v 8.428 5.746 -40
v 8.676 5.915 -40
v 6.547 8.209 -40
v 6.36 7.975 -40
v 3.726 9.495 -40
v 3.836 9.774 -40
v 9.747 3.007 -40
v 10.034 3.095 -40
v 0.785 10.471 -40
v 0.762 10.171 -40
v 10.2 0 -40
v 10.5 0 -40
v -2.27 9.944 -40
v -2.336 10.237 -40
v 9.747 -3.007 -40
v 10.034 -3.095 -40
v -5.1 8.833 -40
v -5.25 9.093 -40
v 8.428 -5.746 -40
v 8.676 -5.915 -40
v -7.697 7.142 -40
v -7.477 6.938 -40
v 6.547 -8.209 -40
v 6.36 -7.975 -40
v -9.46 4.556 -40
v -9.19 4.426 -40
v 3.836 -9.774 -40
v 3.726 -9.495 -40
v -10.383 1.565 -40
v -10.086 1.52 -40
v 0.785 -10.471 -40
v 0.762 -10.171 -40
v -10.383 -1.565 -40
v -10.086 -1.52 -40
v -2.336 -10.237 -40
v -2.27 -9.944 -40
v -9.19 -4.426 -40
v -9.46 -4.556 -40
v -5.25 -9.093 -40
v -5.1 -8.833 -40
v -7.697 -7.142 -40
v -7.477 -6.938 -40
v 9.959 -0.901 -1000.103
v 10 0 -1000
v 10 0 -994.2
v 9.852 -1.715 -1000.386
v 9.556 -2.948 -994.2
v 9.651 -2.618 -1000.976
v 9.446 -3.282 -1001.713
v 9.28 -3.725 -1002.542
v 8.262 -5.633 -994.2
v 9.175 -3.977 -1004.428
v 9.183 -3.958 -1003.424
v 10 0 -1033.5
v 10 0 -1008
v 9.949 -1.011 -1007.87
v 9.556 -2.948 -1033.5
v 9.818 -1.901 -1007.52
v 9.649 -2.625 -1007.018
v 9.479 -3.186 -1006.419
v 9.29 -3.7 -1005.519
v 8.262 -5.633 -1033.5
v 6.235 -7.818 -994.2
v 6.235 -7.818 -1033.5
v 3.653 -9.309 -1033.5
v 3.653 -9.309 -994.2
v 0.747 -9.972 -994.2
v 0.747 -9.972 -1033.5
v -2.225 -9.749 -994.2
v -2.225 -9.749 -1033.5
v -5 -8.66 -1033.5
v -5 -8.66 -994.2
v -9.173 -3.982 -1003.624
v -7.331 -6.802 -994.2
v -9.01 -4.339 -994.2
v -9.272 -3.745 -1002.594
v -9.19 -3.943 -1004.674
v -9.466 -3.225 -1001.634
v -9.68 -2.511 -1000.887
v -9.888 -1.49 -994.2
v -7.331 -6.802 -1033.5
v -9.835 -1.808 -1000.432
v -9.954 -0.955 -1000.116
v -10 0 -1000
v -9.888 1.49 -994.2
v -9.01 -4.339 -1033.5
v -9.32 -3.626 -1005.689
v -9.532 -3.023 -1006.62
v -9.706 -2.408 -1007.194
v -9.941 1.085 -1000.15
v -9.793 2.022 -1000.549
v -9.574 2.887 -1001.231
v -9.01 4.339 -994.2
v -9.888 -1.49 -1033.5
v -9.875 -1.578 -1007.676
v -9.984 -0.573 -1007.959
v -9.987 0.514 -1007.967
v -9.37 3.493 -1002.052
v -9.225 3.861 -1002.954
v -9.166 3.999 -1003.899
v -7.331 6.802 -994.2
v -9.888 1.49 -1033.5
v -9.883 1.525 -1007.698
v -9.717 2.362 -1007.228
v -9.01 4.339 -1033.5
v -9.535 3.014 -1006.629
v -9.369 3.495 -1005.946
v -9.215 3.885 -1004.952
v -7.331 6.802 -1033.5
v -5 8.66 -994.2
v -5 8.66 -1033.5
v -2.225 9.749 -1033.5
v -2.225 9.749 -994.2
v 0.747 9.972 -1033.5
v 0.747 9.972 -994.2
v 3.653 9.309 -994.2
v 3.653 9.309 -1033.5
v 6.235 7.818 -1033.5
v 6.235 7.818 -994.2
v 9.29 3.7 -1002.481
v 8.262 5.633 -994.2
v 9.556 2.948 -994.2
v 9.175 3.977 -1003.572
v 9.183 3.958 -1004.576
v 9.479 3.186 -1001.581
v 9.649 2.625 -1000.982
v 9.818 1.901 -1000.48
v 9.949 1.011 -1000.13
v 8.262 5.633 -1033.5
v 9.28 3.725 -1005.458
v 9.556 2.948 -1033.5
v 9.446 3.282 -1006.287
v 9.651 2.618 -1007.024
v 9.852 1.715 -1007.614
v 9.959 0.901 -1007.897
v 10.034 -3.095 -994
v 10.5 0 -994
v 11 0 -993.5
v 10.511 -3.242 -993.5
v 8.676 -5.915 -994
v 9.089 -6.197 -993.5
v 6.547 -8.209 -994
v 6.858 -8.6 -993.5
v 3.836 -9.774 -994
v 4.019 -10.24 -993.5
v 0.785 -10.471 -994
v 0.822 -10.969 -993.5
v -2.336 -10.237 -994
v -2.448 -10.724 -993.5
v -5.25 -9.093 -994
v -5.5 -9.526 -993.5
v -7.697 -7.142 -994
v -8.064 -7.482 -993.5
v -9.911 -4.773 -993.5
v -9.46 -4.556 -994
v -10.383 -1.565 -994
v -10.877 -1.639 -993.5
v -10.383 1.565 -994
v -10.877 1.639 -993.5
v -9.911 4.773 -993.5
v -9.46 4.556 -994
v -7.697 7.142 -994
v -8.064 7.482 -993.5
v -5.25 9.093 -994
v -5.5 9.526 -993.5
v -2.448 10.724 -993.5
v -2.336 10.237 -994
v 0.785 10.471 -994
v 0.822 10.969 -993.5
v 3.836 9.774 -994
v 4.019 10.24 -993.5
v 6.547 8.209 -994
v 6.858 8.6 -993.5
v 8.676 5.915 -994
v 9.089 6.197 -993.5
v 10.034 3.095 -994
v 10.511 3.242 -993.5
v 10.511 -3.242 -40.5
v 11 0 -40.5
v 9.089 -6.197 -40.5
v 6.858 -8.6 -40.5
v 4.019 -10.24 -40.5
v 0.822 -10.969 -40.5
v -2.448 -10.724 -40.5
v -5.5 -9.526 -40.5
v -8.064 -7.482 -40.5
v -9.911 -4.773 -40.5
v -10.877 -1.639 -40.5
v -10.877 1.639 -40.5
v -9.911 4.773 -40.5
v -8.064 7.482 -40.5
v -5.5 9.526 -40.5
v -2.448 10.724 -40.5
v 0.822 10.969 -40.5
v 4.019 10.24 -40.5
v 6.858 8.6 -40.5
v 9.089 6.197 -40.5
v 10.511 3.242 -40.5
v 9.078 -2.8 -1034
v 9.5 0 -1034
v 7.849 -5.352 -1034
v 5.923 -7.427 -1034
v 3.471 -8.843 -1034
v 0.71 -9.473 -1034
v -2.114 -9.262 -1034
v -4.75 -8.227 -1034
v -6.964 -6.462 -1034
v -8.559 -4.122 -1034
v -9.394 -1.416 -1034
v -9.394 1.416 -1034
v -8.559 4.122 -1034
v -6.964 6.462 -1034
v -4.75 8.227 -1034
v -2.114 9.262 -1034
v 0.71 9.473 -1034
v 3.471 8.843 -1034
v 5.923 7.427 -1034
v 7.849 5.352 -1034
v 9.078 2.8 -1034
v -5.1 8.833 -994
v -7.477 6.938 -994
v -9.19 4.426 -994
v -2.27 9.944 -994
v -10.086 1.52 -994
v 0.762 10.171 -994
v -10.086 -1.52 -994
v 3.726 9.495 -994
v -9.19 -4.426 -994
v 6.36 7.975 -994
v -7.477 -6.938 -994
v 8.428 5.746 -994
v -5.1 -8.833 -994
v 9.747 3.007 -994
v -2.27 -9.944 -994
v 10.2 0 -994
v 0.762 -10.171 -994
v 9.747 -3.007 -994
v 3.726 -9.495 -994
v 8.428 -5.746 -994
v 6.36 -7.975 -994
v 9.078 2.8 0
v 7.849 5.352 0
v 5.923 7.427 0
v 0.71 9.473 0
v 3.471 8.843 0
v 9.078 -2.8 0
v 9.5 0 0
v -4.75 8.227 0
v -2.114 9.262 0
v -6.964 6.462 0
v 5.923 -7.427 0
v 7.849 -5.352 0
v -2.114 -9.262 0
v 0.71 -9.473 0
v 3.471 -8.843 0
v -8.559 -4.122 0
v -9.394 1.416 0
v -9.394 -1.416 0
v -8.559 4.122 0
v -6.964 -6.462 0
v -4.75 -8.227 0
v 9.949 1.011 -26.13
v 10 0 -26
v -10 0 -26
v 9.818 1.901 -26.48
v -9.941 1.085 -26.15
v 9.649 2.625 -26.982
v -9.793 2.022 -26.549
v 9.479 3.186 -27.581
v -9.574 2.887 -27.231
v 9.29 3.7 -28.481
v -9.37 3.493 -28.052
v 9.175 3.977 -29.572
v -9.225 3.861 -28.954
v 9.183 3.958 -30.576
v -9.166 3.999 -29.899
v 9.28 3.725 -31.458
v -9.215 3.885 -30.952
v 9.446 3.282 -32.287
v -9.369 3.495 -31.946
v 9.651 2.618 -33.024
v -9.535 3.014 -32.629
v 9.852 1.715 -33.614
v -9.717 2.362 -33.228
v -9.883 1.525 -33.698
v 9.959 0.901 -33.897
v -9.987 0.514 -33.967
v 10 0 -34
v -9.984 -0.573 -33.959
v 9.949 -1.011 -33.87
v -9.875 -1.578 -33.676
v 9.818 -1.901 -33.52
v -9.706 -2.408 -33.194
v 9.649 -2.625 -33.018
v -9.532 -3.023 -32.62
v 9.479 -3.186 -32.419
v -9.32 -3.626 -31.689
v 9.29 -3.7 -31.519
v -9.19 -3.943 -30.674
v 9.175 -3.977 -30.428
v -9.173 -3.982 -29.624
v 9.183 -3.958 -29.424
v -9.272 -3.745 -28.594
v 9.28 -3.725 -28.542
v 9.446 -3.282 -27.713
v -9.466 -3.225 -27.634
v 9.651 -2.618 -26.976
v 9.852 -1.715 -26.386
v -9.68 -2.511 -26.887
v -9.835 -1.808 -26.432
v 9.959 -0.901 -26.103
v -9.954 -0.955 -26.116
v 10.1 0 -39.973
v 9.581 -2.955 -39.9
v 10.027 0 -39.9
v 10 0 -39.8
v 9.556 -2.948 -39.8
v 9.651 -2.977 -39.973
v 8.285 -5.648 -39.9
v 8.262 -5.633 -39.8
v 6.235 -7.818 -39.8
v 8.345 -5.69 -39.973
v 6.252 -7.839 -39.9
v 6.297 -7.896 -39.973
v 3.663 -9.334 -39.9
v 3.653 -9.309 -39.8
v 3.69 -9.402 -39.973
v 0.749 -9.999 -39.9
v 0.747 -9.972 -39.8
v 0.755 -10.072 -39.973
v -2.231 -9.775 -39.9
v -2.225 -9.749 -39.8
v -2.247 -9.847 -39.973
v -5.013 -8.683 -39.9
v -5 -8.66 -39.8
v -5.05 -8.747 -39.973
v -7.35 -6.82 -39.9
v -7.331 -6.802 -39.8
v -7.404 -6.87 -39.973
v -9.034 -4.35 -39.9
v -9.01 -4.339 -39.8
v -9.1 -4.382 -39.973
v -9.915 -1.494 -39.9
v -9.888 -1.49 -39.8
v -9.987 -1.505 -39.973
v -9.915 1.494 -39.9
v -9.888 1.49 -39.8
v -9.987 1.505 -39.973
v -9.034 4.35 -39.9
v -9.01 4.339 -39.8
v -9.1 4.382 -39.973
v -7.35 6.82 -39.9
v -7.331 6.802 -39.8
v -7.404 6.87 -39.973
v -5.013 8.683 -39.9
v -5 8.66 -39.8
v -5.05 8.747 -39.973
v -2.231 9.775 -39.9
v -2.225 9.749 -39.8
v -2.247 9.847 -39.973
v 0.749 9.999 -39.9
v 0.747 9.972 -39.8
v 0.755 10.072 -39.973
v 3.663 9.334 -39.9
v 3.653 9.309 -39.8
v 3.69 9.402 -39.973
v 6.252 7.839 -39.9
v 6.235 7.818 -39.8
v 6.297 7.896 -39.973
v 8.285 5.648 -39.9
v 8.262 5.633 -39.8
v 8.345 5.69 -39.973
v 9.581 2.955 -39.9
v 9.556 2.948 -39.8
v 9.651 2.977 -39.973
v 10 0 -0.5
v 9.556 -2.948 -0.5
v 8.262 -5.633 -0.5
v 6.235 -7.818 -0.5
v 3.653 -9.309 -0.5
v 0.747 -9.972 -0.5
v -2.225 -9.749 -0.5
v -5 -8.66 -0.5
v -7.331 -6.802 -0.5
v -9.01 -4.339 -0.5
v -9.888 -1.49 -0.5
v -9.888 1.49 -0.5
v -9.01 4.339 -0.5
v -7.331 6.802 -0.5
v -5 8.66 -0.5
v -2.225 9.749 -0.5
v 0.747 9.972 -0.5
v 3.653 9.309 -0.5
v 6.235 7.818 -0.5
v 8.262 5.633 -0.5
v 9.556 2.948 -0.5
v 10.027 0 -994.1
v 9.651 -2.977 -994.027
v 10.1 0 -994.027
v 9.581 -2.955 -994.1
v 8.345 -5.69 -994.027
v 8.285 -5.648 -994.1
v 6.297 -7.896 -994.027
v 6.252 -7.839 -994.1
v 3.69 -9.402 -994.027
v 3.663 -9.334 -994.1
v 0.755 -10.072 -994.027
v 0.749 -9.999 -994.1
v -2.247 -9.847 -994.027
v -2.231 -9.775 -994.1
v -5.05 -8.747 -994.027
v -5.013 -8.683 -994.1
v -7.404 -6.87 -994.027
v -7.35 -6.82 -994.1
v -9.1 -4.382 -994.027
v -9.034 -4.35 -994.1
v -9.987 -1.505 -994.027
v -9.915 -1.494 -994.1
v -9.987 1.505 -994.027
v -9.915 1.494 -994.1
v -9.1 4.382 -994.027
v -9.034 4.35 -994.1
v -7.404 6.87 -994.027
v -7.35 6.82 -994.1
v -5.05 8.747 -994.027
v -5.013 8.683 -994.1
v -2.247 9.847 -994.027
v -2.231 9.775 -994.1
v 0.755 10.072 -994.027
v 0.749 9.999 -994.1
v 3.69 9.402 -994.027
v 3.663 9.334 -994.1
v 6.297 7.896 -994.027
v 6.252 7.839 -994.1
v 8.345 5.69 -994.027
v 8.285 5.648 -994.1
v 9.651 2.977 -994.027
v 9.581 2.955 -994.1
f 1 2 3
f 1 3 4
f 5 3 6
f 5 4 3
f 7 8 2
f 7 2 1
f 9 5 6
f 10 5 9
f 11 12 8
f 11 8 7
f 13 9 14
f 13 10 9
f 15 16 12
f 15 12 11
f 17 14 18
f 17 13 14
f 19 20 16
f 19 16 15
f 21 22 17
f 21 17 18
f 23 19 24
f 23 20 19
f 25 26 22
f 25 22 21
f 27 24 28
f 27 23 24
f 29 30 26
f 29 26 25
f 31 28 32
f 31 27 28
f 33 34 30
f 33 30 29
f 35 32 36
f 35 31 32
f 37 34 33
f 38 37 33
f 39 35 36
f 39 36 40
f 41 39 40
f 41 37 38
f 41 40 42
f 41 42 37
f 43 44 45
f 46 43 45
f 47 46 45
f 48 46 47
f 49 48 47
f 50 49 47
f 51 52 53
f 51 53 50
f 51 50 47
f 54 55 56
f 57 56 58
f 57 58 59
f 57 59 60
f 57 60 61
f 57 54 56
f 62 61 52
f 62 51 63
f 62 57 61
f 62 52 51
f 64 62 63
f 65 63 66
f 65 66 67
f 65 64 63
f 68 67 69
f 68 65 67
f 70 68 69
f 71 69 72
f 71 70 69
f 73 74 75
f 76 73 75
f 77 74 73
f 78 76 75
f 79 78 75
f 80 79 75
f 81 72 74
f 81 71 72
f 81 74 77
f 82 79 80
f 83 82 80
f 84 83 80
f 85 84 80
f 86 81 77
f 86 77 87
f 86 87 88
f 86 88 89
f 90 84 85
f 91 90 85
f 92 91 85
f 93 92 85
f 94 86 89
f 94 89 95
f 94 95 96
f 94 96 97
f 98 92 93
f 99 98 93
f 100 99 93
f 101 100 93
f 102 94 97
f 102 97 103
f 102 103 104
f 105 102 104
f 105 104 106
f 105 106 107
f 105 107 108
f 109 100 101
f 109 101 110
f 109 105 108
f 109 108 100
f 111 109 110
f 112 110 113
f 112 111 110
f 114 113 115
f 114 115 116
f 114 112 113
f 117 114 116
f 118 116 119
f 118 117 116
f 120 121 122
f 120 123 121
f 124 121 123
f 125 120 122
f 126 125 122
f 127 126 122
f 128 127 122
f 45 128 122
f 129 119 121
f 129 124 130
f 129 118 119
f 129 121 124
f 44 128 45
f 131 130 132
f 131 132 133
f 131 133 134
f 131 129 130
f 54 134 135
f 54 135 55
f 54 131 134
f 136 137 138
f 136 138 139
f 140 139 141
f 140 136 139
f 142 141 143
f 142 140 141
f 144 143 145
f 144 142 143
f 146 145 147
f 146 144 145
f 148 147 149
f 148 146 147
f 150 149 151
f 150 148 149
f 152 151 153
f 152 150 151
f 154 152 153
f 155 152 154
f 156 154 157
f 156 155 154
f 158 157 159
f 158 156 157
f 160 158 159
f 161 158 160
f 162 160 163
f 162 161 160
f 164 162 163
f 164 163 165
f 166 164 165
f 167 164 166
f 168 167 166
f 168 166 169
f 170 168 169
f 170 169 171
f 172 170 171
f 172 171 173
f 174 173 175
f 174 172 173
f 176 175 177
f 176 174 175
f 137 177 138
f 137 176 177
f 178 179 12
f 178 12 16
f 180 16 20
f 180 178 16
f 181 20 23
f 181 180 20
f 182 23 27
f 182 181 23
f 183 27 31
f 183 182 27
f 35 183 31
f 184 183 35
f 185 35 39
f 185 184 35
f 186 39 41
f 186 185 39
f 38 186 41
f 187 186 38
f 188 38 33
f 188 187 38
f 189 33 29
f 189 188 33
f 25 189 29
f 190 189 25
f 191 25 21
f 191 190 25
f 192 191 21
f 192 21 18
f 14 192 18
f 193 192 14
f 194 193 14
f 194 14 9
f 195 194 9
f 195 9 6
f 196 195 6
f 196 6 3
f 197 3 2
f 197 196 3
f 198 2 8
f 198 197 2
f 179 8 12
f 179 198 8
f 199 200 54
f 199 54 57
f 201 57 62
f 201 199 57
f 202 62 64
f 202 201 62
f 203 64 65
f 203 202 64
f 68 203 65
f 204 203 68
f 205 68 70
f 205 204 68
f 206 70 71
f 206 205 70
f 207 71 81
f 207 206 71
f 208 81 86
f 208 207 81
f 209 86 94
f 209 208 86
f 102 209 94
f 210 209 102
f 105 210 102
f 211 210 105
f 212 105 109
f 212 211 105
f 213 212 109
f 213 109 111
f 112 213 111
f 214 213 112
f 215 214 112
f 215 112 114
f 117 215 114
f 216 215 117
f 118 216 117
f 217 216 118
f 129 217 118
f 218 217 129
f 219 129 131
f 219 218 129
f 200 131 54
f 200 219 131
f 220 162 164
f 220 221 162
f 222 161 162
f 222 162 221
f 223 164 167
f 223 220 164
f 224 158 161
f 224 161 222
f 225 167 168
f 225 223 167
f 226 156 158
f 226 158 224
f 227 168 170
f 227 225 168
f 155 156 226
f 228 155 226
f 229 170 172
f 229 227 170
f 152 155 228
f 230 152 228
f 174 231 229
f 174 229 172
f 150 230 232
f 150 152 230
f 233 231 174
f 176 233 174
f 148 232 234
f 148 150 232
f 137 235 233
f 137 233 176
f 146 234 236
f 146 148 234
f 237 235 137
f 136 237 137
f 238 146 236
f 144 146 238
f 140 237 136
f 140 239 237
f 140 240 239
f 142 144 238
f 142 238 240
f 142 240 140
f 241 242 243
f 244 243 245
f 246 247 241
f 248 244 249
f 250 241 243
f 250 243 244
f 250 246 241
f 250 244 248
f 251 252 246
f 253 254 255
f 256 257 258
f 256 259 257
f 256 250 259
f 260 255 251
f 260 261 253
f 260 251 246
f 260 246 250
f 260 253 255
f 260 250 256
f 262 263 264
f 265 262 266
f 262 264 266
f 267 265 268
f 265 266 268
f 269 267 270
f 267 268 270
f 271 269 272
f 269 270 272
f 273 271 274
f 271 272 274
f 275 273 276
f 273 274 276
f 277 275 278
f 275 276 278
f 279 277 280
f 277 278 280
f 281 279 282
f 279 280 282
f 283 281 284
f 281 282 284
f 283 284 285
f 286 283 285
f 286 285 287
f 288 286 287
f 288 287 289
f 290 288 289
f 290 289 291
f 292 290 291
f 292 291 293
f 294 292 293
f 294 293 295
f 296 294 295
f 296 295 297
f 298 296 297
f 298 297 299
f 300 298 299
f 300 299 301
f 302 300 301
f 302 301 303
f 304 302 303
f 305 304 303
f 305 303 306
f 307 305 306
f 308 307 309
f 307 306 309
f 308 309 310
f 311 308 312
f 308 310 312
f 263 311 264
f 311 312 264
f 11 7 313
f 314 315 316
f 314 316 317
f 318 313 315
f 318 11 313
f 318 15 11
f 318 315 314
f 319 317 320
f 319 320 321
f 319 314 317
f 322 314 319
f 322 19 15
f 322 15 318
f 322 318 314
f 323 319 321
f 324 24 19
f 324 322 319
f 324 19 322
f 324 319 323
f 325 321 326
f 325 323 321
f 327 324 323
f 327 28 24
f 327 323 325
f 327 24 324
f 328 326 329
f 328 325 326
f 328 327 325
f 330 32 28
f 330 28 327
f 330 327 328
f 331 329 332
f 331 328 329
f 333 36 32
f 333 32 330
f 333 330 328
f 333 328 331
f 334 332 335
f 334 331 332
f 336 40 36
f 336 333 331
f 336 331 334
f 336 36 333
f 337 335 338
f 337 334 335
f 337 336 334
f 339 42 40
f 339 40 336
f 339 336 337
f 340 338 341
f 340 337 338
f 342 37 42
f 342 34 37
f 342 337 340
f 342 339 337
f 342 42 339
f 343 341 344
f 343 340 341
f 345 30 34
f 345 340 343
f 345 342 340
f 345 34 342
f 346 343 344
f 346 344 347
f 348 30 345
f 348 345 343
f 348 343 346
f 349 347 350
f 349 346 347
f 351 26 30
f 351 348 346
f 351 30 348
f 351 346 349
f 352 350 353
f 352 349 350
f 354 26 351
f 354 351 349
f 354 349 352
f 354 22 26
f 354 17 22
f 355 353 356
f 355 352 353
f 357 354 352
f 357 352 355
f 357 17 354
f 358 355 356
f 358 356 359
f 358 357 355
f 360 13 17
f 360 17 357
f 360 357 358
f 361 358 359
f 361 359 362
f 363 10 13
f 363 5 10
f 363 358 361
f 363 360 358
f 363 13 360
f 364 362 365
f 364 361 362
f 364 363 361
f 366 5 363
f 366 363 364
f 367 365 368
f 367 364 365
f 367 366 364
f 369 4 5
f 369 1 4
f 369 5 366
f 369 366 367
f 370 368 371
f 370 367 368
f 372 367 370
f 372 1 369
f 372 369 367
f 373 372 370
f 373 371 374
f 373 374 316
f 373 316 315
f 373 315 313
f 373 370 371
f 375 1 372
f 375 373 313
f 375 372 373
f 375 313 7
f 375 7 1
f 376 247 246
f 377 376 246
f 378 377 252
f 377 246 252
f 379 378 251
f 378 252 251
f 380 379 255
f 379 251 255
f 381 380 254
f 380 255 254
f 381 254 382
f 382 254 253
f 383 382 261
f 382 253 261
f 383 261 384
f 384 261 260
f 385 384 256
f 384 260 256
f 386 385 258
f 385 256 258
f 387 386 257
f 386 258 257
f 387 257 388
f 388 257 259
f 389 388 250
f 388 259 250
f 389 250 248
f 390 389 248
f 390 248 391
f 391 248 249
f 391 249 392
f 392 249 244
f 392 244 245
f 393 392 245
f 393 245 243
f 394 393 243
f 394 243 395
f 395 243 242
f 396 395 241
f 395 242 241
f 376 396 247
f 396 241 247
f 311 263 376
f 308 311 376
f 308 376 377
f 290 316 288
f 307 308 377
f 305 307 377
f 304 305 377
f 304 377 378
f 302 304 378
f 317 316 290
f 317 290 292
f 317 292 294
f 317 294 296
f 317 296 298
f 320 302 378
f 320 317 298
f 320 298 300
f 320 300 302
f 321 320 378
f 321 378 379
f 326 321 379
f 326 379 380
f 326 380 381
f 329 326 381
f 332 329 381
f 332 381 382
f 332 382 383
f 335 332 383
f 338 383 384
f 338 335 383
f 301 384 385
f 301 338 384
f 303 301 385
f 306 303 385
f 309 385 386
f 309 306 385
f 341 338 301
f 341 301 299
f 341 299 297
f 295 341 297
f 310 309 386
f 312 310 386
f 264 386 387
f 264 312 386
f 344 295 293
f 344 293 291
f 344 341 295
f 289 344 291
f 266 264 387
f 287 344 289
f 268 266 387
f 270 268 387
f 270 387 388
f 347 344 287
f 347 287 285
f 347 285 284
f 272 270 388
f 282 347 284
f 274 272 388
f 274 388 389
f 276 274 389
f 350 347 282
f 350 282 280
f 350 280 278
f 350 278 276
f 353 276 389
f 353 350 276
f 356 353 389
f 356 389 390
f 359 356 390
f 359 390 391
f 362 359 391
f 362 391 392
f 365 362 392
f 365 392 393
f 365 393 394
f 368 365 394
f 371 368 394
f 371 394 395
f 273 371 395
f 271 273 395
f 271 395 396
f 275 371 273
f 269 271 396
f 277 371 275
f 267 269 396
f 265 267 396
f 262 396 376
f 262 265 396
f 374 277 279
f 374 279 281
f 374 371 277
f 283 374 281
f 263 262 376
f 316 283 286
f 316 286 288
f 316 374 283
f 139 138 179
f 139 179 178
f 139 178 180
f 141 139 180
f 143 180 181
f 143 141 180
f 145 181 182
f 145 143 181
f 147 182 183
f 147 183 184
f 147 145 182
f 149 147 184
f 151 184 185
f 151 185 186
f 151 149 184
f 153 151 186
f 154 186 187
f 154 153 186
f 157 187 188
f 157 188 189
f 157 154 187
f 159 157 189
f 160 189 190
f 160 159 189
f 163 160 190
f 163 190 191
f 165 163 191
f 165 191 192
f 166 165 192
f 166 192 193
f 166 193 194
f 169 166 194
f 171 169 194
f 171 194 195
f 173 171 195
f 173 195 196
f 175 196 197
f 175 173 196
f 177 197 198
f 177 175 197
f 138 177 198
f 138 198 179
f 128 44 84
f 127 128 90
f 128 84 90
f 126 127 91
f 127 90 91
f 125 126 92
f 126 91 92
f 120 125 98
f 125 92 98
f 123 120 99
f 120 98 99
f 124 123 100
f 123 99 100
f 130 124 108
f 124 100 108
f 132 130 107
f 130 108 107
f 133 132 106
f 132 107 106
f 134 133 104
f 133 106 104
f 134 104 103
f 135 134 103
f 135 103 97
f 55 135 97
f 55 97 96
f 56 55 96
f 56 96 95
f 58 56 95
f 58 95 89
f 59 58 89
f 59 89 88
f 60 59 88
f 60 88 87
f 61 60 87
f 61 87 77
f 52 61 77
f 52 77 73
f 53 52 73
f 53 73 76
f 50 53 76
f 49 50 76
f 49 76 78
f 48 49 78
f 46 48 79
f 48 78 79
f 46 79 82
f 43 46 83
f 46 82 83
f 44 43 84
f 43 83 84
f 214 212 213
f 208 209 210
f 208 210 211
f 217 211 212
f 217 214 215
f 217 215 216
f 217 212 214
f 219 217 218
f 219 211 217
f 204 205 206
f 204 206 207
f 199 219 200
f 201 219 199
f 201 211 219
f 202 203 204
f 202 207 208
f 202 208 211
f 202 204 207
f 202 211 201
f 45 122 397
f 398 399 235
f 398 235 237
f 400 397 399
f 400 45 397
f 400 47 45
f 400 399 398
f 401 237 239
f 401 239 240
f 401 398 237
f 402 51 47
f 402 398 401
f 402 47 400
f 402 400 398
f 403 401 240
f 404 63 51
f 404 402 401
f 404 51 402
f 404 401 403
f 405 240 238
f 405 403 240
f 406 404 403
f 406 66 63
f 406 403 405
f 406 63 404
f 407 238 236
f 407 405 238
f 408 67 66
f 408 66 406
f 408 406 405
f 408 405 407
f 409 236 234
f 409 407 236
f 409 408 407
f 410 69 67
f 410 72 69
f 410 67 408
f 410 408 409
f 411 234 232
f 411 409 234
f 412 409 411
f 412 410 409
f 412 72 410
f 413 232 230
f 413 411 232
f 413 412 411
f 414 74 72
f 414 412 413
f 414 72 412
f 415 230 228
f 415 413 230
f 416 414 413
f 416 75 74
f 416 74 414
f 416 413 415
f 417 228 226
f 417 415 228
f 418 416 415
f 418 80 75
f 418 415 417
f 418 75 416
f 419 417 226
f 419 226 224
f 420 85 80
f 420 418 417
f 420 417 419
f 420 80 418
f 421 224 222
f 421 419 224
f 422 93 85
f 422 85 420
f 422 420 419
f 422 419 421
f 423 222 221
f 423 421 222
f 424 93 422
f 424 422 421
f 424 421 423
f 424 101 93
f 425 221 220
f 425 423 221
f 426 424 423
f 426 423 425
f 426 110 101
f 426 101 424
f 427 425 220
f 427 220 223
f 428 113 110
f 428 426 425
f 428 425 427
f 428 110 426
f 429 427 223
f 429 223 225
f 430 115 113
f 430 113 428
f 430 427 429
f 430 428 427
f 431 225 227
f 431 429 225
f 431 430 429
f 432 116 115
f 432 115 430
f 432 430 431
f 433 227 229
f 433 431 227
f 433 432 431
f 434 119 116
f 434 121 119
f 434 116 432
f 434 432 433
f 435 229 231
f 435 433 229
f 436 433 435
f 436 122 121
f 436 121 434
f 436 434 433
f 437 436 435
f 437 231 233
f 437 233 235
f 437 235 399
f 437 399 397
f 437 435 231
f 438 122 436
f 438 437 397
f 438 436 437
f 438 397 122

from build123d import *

# Parameters (mm, degrees)
SKETCH_2_R          = 4
CUT_EXTRUDE_1_DEPTH = 1035.271724452
SKETCH_3_R          = 4
CUT_EXTRUDE_2_DEPTH = 1035.271724452
FILLET_1_R          = 0.2
CHAMFER_1_SIZE      = 0.5


with BuildPart() as part:
    # Эскиз1 → Повернуть1 (revolve)
    with BuildSketch(Plane(origin=(0, 0, 0), x_dir=(0, 0, -1), z_dir=(1, 0, 0)), mode=Mode.PRIVATE) as revolve_1_sk:
        Polygon((0, 0), (0, 10), (40, 10), (40, 11), (994, 11), (994, 10), (1034, 10), (1034, 0), align=None)
    revolve(revolve_1_sk.sketch.rotate(Axis((0, 0, 0), (0, 0, -1)), 90), axis=Axis((0, 0, 0), (0, 0, -1)))

    # Эскиз2 → Вырез-Вытянуть1 (cut, through all)
    with BuildSketch(Plane.ZY.offset(10)):
        with Locations((-30, 0)):
            Circle(SKETCH_2_R)
    extrude(amount=-CUT_EXTRUDE_1_DEPTH, mode=Mode.SUBTRACT)

    # Эскиз3 → Вырез-Вытянуть2 (cut, through all)
    with BuildSketch(Plane.ZY.offset(10)):
        with Locations((-1004, 0)):
            Circle(SKETCH_3_R)
    extrude(amount=-CUT_EXTRUDE_2_DEPTH, mode=Mode.SUBTRACT)

    # Скругление1
    fillet_1_edges = [part.edges().sort_by_distance(p)[0] for p in [
        (-10, 0, -994),
        (-10, 0, -40),
    ]]
    fillet(fillet_1_edges, radius=FILLET_1_R)

    # Фаска1
    chamfer_1_edges = [part.edges().sort_by_distance(p)[0] for p in [
        (-10, 0, -1034),
        (-11, 0, -994),
        (-11, 0, -40),
        (-10, 0, 0),
    ]]
    chamfer(chamfer_1_edges, length=CHAMFER_1_SIZE)


solid = part.part
